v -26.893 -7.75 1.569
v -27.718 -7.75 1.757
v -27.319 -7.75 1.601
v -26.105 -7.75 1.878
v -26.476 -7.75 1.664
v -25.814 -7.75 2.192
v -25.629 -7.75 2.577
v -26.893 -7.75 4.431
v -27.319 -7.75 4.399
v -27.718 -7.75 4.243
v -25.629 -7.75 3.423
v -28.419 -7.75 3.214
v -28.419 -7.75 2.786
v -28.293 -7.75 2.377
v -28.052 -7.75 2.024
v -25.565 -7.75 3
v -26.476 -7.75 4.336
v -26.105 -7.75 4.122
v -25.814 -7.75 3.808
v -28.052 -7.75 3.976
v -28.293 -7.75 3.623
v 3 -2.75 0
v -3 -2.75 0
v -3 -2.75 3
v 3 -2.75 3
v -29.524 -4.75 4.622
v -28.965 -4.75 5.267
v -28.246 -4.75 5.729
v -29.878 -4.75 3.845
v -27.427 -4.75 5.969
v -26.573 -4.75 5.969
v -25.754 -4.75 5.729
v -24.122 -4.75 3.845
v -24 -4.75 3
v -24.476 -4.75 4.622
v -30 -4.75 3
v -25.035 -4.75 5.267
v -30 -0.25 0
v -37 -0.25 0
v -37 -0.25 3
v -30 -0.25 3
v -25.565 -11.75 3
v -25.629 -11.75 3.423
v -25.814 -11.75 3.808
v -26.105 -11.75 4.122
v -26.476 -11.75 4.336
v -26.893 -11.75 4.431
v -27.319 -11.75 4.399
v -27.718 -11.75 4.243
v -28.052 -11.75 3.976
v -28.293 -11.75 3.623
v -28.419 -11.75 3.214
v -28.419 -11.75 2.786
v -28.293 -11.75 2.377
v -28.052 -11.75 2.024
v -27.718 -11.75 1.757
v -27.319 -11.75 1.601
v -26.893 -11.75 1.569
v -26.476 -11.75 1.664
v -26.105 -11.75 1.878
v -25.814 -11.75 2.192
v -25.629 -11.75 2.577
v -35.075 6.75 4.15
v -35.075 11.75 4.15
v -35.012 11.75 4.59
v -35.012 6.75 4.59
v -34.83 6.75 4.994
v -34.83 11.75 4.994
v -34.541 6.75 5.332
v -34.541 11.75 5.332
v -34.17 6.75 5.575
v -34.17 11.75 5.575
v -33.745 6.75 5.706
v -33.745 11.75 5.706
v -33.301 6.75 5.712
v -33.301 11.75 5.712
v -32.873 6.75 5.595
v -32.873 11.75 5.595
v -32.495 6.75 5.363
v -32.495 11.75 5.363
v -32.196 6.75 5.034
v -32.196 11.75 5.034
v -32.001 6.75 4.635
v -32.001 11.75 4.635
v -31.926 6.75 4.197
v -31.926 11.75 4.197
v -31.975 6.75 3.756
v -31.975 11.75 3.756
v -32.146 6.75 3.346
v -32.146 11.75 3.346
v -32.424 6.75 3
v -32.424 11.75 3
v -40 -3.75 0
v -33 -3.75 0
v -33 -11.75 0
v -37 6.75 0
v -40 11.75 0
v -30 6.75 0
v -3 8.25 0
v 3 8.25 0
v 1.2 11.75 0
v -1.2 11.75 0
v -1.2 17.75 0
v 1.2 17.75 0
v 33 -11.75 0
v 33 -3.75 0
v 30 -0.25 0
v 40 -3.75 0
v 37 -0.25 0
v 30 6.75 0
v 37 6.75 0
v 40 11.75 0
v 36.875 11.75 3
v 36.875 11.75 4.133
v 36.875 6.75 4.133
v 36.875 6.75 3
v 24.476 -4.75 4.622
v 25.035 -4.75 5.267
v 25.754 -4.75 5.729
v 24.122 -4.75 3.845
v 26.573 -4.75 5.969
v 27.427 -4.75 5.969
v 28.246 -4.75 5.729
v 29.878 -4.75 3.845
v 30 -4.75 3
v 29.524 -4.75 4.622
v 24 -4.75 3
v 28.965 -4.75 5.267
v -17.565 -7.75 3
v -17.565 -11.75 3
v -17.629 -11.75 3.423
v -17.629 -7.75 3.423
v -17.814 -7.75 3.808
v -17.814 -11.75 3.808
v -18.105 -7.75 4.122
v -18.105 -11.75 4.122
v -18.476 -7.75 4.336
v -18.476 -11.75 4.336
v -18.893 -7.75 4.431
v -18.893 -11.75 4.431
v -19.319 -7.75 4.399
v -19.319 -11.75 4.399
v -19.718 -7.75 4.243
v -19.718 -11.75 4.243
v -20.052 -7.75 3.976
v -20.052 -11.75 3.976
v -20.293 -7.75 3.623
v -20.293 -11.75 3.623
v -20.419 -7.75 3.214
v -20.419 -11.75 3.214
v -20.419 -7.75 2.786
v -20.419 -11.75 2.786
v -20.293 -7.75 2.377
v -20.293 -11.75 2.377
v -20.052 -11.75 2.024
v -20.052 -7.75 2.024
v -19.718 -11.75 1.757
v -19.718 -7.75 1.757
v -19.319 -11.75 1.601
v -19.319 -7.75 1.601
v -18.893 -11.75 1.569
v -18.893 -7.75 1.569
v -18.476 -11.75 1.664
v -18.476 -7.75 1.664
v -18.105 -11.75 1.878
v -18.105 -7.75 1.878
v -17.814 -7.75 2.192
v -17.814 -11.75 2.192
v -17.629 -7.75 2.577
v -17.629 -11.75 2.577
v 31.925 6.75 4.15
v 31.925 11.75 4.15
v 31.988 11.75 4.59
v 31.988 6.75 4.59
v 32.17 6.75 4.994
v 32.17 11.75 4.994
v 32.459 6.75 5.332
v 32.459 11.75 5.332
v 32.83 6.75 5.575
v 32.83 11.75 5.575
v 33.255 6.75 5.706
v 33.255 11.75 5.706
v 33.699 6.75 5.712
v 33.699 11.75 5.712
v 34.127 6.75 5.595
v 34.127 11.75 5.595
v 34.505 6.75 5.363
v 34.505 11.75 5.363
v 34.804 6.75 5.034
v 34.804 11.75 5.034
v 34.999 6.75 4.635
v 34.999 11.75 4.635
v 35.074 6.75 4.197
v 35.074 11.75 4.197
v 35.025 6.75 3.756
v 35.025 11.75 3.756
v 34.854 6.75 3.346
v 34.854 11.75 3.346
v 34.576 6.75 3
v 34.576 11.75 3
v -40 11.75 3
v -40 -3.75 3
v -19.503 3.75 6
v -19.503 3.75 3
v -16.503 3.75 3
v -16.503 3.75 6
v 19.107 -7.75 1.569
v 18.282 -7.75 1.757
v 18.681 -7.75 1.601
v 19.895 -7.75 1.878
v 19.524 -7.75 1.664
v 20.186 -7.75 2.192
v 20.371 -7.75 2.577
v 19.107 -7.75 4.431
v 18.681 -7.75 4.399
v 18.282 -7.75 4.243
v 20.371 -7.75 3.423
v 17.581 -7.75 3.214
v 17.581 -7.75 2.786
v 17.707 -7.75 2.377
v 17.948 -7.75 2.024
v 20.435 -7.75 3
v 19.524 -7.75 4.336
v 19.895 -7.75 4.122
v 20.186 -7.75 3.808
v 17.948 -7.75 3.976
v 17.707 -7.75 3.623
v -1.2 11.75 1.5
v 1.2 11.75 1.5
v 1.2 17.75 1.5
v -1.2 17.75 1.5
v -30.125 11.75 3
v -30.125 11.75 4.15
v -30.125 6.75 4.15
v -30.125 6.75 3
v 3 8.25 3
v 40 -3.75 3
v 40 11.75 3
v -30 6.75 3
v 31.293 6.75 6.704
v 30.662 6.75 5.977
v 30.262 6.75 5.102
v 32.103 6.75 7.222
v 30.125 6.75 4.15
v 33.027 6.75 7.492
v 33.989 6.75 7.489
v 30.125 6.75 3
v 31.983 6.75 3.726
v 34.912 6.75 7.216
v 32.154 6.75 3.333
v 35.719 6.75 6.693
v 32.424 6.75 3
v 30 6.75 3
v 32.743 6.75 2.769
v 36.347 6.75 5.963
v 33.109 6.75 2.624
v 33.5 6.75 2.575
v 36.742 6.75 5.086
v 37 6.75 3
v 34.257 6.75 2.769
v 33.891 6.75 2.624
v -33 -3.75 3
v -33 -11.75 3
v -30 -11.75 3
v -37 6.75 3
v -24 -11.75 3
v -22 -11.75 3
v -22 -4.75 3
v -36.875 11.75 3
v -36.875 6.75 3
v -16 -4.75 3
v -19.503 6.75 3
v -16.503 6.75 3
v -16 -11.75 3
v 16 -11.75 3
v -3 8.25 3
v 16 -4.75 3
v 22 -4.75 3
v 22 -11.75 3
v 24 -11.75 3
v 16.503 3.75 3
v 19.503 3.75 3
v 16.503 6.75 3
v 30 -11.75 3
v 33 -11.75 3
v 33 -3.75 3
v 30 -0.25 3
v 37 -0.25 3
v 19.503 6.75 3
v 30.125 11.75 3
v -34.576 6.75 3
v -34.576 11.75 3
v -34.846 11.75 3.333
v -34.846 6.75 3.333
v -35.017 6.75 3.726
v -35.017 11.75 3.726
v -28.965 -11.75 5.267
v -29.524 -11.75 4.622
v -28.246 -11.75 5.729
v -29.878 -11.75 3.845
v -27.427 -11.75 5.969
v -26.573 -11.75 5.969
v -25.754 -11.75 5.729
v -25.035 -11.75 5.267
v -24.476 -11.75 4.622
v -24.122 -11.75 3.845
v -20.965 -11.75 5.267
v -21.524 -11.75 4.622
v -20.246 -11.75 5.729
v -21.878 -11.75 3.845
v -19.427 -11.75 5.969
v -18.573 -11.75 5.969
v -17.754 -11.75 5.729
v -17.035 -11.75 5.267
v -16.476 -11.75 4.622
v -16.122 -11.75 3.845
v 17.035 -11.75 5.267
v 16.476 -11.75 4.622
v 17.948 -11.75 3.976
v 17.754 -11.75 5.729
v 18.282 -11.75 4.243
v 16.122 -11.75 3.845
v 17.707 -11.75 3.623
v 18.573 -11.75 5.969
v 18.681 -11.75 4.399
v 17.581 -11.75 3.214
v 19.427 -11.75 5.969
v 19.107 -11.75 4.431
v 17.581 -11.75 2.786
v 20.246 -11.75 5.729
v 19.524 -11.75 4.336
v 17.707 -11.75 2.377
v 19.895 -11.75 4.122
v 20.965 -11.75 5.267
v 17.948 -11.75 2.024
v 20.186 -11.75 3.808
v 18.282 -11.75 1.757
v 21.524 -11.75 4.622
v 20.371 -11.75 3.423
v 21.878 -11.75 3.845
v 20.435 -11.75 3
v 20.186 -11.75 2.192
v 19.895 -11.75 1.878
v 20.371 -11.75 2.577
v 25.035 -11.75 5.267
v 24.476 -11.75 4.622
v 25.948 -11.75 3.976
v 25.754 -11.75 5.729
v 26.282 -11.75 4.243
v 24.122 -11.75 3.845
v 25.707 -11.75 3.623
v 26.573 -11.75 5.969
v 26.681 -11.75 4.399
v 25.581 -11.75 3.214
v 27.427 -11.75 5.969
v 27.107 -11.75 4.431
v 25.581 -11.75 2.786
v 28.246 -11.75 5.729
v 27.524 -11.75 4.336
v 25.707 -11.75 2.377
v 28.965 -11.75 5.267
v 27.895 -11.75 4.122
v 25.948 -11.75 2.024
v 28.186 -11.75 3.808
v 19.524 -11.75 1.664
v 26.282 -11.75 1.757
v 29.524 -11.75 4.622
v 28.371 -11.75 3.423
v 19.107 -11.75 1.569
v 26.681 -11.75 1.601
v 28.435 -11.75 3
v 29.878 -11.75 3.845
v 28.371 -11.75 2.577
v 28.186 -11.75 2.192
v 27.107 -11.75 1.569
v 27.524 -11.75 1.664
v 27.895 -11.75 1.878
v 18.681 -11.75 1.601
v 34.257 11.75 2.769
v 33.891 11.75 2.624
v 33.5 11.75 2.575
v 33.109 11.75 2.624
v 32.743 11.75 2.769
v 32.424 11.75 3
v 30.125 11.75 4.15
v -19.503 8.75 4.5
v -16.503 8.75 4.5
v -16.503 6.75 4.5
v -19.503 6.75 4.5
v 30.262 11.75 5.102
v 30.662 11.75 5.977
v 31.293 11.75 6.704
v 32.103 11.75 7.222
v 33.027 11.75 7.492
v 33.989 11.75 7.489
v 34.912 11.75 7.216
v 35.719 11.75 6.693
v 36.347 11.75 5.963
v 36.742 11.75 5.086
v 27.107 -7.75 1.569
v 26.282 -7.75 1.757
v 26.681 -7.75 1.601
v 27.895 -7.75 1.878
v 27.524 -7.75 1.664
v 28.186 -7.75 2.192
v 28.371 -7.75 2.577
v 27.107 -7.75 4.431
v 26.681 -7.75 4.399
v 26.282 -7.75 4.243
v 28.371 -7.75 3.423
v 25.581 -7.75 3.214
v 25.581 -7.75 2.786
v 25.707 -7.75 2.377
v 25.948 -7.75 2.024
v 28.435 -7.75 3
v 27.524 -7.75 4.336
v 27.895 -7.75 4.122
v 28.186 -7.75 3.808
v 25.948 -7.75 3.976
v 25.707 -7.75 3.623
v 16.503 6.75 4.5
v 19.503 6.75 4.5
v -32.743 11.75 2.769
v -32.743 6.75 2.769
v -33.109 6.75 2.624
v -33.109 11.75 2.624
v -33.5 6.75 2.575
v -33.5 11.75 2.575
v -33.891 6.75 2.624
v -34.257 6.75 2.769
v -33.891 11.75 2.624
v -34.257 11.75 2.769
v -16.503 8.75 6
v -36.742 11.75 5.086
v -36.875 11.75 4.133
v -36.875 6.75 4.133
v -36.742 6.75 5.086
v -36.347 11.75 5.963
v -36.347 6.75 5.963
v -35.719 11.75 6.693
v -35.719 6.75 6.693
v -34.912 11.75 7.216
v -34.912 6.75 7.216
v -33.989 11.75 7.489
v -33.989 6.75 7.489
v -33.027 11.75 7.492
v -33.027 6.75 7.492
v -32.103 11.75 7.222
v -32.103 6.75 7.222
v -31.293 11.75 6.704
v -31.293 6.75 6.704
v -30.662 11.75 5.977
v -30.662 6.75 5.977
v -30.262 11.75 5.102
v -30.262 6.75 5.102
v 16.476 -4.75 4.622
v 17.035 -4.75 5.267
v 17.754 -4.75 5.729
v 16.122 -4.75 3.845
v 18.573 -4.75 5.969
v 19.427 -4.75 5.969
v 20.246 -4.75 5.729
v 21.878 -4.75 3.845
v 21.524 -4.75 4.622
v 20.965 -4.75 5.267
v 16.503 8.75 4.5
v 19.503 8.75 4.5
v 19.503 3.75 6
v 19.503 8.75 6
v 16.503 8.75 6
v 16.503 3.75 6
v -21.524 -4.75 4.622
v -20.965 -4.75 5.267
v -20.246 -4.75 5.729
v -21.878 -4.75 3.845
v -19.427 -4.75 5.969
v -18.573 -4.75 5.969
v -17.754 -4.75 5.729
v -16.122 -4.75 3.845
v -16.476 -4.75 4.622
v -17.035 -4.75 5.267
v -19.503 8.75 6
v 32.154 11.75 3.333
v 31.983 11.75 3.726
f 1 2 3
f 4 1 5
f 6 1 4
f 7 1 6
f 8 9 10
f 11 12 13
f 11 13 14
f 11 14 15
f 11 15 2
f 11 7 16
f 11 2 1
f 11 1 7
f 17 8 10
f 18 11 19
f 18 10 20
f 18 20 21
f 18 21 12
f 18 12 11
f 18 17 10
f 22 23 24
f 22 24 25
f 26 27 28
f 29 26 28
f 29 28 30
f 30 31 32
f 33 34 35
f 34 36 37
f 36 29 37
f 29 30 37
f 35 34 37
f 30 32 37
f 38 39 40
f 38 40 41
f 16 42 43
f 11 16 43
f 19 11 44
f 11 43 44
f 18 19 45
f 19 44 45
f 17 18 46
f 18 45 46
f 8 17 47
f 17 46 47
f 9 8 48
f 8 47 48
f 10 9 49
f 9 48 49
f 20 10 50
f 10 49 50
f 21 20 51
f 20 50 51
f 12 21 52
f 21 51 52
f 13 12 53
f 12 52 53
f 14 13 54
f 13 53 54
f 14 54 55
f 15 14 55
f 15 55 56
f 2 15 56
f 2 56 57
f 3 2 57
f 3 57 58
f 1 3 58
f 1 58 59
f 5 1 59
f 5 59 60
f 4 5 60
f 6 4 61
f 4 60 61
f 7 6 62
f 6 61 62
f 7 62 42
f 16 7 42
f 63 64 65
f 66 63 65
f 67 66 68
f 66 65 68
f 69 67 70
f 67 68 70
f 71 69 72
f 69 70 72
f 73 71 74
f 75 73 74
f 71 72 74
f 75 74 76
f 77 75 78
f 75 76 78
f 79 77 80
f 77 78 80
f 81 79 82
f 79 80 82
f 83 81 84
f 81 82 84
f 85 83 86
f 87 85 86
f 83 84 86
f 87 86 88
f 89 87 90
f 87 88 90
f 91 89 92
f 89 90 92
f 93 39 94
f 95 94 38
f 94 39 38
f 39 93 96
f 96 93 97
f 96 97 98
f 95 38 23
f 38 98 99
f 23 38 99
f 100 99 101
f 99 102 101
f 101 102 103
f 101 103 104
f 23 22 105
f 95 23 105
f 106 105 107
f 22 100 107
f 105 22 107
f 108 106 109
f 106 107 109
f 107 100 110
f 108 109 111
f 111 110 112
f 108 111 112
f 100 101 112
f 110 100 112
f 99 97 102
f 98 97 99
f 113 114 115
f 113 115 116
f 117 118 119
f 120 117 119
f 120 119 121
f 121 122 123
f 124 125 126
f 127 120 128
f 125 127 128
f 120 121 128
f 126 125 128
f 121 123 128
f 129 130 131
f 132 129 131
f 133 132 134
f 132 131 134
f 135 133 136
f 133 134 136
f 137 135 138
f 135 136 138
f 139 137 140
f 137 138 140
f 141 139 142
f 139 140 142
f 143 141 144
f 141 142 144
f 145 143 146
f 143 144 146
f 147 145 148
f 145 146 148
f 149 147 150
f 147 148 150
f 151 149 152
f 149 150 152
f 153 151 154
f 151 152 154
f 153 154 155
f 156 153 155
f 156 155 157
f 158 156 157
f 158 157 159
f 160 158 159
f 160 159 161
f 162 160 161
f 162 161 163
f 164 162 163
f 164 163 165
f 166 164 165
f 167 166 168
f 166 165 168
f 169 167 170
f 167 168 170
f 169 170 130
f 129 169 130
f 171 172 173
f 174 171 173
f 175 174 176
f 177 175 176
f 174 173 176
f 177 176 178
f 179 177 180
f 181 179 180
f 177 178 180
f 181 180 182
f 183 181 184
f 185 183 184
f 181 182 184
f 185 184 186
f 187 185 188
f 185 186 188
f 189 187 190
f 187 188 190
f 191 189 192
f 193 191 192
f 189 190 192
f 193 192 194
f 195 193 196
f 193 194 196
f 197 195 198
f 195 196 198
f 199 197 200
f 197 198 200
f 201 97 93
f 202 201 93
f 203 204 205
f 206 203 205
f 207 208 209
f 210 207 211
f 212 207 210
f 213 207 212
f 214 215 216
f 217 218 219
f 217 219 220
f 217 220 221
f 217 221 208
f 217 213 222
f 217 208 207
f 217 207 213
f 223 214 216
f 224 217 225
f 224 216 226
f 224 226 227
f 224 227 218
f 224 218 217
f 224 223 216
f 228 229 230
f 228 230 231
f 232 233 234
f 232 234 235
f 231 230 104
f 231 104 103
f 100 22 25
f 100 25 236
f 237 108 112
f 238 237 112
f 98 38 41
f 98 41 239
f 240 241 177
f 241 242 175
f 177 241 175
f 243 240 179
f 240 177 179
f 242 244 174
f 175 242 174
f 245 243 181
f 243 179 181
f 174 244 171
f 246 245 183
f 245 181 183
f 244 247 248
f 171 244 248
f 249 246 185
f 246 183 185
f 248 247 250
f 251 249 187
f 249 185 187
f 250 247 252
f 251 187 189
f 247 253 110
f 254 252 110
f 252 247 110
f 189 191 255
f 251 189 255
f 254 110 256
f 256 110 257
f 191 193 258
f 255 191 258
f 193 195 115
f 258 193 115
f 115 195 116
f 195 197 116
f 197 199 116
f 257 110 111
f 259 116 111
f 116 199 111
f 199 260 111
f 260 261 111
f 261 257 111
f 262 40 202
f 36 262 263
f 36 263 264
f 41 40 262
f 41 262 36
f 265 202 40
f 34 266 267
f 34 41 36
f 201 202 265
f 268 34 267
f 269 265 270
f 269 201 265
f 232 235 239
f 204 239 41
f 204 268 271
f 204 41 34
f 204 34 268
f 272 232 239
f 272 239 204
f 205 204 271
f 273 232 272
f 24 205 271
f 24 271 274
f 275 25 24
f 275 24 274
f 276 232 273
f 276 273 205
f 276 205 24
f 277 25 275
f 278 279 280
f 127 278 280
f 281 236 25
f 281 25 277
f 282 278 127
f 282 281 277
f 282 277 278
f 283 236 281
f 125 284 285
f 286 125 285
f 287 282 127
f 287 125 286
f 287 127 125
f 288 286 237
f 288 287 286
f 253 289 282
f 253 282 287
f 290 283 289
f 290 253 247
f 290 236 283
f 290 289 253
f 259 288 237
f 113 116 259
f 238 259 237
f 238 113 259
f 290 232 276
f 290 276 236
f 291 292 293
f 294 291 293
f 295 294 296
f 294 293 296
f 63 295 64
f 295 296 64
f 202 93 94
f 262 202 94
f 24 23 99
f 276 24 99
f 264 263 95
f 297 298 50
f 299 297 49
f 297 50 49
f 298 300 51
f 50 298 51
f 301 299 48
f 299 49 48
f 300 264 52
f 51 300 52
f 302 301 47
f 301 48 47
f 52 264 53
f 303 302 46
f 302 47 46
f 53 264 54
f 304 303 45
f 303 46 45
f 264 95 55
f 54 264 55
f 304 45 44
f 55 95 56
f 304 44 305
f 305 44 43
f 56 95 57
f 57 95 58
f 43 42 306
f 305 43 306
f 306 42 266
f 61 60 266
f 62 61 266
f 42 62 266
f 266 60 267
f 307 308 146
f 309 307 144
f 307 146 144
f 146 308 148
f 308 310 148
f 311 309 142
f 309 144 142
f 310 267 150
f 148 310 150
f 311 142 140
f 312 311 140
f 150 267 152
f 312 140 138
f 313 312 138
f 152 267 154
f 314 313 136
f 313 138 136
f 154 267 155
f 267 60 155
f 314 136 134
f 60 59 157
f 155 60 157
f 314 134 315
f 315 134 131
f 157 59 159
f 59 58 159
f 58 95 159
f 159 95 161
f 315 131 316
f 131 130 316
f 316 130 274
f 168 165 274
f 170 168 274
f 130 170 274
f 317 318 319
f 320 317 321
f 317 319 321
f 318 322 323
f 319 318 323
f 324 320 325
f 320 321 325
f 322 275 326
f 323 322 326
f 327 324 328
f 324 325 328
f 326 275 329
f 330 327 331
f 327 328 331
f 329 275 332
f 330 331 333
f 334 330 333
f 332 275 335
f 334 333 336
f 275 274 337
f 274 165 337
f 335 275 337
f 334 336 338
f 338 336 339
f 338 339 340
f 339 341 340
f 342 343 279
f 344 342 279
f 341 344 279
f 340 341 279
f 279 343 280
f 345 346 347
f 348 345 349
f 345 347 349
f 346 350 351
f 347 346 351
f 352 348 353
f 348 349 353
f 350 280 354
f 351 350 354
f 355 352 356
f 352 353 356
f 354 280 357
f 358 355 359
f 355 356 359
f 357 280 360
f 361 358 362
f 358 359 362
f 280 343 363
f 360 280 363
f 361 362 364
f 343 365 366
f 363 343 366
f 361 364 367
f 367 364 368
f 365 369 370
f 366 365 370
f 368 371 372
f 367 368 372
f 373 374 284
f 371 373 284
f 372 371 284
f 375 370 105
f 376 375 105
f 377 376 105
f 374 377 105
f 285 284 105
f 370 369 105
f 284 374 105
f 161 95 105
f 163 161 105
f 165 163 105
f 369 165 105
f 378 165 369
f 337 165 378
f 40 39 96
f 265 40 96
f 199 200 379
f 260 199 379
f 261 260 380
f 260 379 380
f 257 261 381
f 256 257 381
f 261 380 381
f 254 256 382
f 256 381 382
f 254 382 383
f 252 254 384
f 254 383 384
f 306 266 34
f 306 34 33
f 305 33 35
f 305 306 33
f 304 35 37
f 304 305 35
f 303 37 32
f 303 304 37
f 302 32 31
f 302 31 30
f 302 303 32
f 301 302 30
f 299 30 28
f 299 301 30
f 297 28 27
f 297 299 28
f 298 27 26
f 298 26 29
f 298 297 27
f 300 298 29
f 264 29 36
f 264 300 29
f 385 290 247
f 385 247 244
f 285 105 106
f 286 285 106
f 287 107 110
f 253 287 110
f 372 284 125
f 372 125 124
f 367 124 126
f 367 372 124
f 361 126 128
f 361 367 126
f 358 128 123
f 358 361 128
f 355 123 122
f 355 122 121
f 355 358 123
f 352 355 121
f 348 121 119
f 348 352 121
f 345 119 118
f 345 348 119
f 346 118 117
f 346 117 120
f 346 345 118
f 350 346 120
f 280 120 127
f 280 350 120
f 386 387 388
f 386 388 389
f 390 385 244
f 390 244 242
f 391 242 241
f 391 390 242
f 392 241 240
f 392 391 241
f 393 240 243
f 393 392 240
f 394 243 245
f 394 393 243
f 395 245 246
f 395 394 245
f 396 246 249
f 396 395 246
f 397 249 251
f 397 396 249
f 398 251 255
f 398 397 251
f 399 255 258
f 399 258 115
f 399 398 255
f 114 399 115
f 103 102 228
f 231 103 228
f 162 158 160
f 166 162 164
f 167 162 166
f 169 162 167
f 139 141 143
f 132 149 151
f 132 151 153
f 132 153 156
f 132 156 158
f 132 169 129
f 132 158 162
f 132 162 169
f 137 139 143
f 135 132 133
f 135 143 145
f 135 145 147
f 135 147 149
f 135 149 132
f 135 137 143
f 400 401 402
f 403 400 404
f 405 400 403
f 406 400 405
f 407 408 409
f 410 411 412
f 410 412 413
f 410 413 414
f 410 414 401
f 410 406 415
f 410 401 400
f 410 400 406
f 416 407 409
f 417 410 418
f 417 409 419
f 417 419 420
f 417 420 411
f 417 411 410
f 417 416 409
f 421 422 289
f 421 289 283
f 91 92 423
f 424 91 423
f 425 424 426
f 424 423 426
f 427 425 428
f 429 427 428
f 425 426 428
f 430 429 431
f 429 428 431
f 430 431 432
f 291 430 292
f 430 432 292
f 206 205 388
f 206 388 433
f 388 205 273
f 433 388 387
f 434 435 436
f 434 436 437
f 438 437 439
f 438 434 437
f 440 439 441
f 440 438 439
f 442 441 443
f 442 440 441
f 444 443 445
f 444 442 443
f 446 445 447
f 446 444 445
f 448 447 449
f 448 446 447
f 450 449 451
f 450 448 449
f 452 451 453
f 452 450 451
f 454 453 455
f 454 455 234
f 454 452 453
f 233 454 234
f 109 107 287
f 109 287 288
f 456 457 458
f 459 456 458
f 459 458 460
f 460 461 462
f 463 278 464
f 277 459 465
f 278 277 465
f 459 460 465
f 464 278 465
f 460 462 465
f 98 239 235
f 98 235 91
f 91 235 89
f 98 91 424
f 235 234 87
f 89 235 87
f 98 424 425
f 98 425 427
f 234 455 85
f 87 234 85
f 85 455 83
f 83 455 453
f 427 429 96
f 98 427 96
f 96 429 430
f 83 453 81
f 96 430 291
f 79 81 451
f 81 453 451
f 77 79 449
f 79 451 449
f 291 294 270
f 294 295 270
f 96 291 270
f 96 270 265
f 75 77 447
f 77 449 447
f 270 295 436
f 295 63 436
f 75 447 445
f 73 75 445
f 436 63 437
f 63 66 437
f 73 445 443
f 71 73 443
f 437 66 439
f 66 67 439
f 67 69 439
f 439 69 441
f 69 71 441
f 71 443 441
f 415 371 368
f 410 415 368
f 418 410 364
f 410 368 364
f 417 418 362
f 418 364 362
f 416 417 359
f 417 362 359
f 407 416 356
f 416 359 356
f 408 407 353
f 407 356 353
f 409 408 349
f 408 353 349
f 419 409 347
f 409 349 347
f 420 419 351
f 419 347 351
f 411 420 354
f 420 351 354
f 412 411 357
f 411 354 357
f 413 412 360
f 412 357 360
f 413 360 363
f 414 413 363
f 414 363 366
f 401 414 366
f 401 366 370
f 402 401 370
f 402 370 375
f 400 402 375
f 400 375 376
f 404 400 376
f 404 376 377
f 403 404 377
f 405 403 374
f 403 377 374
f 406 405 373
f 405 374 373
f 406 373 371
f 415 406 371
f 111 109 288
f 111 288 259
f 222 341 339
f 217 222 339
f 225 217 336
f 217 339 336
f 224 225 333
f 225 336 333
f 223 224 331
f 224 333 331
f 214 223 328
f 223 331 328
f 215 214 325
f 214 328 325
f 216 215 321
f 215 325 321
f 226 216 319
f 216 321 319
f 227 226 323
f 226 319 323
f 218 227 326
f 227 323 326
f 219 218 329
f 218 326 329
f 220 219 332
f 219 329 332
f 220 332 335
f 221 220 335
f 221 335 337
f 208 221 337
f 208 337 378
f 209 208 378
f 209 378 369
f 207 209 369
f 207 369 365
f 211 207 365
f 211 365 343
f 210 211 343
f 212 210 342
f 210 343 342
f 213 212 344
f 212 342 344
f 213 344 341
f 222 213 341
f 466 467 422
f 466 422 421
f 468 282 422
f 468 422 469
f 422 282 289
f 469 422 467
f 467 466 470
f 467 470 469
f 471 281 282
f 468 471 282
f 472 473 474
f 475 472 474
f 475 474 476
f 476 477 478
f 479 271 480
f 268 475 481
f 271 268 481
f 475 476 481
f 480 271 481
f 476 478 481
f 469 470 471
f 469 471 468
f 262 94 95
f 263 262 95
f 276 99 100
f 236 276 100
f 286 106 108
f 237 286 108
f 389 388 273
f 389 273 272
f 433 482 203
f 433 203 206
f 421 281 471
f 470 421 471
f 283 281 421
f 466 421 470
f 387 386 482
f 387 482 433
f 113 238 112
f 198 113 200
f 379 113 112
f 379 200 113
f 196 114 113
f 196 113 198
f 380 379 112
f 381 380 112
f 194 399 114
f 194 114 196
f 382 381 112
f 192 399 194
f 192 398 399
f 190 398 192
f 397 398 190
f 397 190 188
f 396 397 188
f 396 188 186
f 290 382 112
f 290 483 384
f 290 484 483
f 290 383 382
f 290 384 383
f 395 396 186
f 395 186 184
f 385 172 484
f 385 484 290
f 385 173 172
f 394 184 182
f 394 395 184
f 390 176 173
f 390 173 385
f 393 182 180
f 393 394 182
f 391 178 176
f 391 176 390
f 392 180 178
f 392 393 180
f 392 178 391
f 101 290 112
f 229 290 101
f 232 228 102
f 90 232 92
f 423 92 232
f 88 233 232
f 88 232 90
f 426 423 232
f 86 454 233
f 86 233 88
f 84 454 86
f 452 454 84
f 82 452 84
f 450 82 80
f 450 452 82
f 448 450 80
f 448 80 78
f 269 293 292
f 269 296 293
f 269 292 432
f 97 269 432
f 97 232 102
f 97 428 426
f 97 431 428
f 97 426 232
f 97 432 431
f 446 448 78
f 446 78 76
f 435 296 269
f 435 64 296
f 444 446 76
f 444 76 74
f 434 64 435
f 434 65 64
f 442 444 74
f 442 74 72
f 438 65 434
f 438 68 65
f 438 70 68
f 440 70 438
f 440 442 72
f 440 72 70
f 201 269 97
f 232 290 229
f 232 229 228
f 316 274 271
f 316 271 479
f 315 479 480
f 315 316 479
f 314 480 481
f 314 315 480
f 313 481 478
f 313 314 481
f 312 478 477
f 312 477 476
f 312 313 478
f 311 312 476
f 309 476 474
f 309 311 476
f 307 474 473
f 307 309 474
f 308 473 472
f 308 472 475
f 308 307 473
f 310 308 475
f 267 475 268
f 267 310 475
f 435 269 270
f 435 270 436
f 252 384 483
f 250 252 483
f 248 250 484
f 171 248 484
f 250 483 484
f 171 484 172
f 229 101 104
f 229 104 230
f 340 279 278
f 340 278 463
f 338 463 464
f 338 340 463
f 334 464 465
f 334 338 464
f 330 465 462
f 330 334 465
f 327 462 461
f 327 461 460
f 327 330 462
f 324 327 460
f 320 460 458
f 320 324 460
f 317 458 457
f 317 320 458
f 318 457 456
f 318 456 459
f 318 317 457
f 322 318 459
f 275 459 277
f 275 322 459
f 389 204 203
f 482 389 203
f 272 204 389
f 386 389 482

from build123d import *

# Parameters (mm, degrees)
F0_W      = 7
F0_H      = 7
F0_W_2    = 3
F0_H_2    = 5
F0_W_3    = 6
F0_H_3    = 11
F1_DEPTH  = 3
F2_DEPTH  = 6
F3_W      = 3
F3_H      = 1.5
F4_DEPTH  = 2
F5_W      = 3
F5_H      = 1.5
F6_DEPTH  = 2
F7_W      = 2.4
F7_H      = 1.5
F8_DEPTH  = 6
F10_DEPTH = 7
F11_R     = 1.435
F12_DEPTH = 4
F14_DEPTH = 5
F15_DEPTH = 5
F16_DEPTH = 5
F17_DEPTH = 5


with BuildPart() as f1:
    # F0 (on Top) → F1 (new body)
    with BuildSketch(Plane.XY):
        Polygon((40, 11.75), (-40, 11.75), (-40, -3.75), (-33, -3.75), (-33, -11.75), (33, -11.75), (33, -3.75), (40, -3.75), align=None)
        with Locations((-33.5, 3.25)):
            Rectangle(F0_W, F0_H, mode=Mode.SUBTRACT)
        with Locations((-18.002523, 6.25)):
            Rectangle(F0_W_2, F0_H_2, mode=Mode.SUBTRACT)
        with Locations((0, 2.75)):
            Rectangle(F0_W_3, F0_H_3, mode=Mode.SUBTRACT)
        with Locations((33.5, 3.25)):
            Rectangle(F0_W, F0_H, mode=Mode.SUBTRACT)
        with Locations((18.002523, 6.25)):
            Rectangle(F0_W_2, F0_H_2, mode=Mode.SUBTRACT)
    extrude(amount=F1_DEPTH)

    # F0 (on Top) → F2 (join)
    with BuildSketch(Plane.XY):
        with Locations((-18.002523, 6.25)):
            Rectangle(F0_W_2, F0_H_2)
        with Locations((18.002523, 6.25)):
            Rectangle(F0_W_2, F0_H_2)
    extrude(amount=F2_DEPTH)

    # F3 (on face) → F4 (cut)
    with BuildSketch(Plane(origin=(0, 8.75, 0), x_dir=(-1, 0, 0), z_dir=(0, 1, 0))):
        with Locations((-18.002523, 3.75)):
            Rectangle(F3_W, F3_H)
    extrude(amount=-F4_DEPTH, mode=Mode.SUBTRACT)

    # F5 (on face) → F6 (cut)
    with BuildSketch(Plane(origin=(0, 8.75, 0), x_dir=(-1, 0, 0), z_dir=(0, 1, 0))):
        with Locations((18.002523, 3.75)):
            Rectangle(F5_W, F5_H)
    extrude(amount=-F6_DEPTH, mode=Mode.SUBTRACT)

    # F7 (on face) → F8 (join)
    with BuildSketch(Plane(origin=(0, 11.75, 0), x_dir=(-1, 0, 0), z_dir=(0, 1, 0))):
        with Locations((0, 0.75)):
            Rectangle(F7_W, F7_H)
    extrude(amount=F8_DEPTH)

    # F9 (on face) → F10 (join)
    with BuildSketch(Plane.XZ.offset(11.75)):
        with BuildLine():
            Line((-30, 3), (-24, 3))
            ThreePointArc((-24, 3), (-27, 6), (-30, 3))
        make_face()
        with BuildLine():
            ThreePointArc((-16, 3), (-19, 6), (-22, 3))
            Line((-22, 3), (-16, 3))
        make_face()
        with BuildLine():
            ThreePointArc((22, 3), (19, 6), (16, 3))
            Line((16, 3), (22, 3))
        make_face()
        with BuildLine():
            ThreePointArc((30, 3), (27, 6), (24, 3))
            Line((24, 3), (30, 3))
        make_face()
    extrude(amount=-F10_DEPTH)

    # F11 (on face) → F12 (cut)
    with BuildSketch(Plane.XZ.offset(11.75)):
        with Locations((-27, 3)):
            Circle(F11_R)
        with Locations((-19, 3)):
            Circle(F11_R)
        with Locations((19, 3)):
            Circle(F11_R)
        with Locations((27, 3)):
            Circle(F11_R)
    extrude(amount=-F12_DEPTH, mode=Mode.SUBTRACT)

    # F13 (on face) → F14 (join)
    with BuildSketch(Plane(origin=(0, 11.75, 0), x_dir=(-1, 0, 0), z_dir=(0, 1, 0))):
        with BuildLine():
            Line((-30.125, 3), (-30.125, 4.15))
            ThreePointArc((-30.125, 4.15), (-33.508255, 7.52499), (-36.87496, 4.133489))
            Line((-36.87496, 4.133489), (-36.87496, 3))
            Line((-36.87496, 3), (-34.576162, 3))
            ThreePointArc((-34.576162, 3), (-34.126765, 5.594919), (-31.925, 4.15))
            ThreePointArc((-31.925, 4.15), (-32.055081, 3.523235), (-32.423838, 3))
            Line((-32.423838, 3), (-30.125, 3))
        make_face()
        with BuildLine():
            Line((-34.576162, 3), (-32.423838, 3))
            ThreePointArc((-32.423838, 3), (-32.055081, 3.523235), (-31.925, 4.15))
            ThreePointArc((-31.925, 4.15), (-34.126765, 5.594919), (-34.576162, 3))
        make_face()
    extrude(amount=-F14_DEPTH)

    # F13 (on face) → F15 (cut, through all)
    with BuildSketch(Plane(origin=(0, 11.75, 0), x_dir=(-1, 0, 0), z_dir=(0, 1, 0))):
        with BuildLine():
            Line((-34.576162, 3), (-32.423838, 3))
            ThreePointArc((-32.423838, 3), (-32.055081, 3.523235), (-31.925, 4.15))
            ThreePointArc((-31.925, 4.15), (-34.126765, 5.594919), (-34.576162, 3))
        make_face()
        with BuildLine():
            ThreePointArc((-34.576162, 3), (-33.5, 2.575), (-32.423838, 3))
            Line((-32.423838, 3), (-34.576162, 3))
        make_face()
    extrude(amount=-F15_DEPTH, mode=Mode.SUBTRACT)

    # F13 (on face) → F16 (join)
    with BuildSketch(Plane(origin=(0, 11.75, 0), x_dir=(-1, 0, 0), z_dir=(0, 1, 0))):
        with BuildLine():
            Line((30.125, 4.15), (30.125, 3))
            Line((30.125, 3), (32.423838, 3))
            ThreePointArc((32.423838, 3), (32.873235, 5.594919), (35.075, 4.15))
            ThreePointArc((35.075, 4.15), (34.944919, 3.523235), (34.576162, 3))
            Line((34.576162, 3), (36.87496, 3))
            Line((36.87496, 3), (36.87496, 4.133489))
            ThreePointArc((36.87496, 4.133489), (33.508255, 7.52499), (30.125, 4.15))
        make_face()
        with BuildLine():
            Line((34.576162, 3), (32.423838, 3))
            ThreePointArc((32.423838, 3), (33.5, 2.575), (34.576162, 3))
        make_face()
        with BuildLine():
            ThreePointArc((35.075, 4.15), (32.873235, 5.594919), (32.423838, 3))
            Line((32.423838, 3), (34.576162, 3))
            ThreePointArc((34.576162, 3), (34.944919, 3.523235), (35.075, 4.15))
        make_face()
    extrude(amount=-F16_DEPTH)

    # F13 (on face) → F17 (cut, through all)
    with BuildSketch(Plane(origin=(0, 11.75, 0), x_dir=(-1, 0, 0), z_dir=(0, 1, 0))):
        with BuildLine():
            ThreePointArc((35.075, 4.15), (32.873235, 5.594919), (32.423838, 3))
            Line((32.423838, 3), (34.576162, 3))
            ThreePointArc((34.576162, 3), (34.944919, 3.523235), (35.075, 4.15))
        make_face()
        with BuildLine():
            Line((34.576162, 3), (32.423838, 3))
            ThreePointArc((32.423838, 3), (33.5, 2.575), (34.576162, 3))
        make_face()
    extrude(amount=-F17_DEPTH, mode=Mode.SUBTRACT)


solid = f1.part
